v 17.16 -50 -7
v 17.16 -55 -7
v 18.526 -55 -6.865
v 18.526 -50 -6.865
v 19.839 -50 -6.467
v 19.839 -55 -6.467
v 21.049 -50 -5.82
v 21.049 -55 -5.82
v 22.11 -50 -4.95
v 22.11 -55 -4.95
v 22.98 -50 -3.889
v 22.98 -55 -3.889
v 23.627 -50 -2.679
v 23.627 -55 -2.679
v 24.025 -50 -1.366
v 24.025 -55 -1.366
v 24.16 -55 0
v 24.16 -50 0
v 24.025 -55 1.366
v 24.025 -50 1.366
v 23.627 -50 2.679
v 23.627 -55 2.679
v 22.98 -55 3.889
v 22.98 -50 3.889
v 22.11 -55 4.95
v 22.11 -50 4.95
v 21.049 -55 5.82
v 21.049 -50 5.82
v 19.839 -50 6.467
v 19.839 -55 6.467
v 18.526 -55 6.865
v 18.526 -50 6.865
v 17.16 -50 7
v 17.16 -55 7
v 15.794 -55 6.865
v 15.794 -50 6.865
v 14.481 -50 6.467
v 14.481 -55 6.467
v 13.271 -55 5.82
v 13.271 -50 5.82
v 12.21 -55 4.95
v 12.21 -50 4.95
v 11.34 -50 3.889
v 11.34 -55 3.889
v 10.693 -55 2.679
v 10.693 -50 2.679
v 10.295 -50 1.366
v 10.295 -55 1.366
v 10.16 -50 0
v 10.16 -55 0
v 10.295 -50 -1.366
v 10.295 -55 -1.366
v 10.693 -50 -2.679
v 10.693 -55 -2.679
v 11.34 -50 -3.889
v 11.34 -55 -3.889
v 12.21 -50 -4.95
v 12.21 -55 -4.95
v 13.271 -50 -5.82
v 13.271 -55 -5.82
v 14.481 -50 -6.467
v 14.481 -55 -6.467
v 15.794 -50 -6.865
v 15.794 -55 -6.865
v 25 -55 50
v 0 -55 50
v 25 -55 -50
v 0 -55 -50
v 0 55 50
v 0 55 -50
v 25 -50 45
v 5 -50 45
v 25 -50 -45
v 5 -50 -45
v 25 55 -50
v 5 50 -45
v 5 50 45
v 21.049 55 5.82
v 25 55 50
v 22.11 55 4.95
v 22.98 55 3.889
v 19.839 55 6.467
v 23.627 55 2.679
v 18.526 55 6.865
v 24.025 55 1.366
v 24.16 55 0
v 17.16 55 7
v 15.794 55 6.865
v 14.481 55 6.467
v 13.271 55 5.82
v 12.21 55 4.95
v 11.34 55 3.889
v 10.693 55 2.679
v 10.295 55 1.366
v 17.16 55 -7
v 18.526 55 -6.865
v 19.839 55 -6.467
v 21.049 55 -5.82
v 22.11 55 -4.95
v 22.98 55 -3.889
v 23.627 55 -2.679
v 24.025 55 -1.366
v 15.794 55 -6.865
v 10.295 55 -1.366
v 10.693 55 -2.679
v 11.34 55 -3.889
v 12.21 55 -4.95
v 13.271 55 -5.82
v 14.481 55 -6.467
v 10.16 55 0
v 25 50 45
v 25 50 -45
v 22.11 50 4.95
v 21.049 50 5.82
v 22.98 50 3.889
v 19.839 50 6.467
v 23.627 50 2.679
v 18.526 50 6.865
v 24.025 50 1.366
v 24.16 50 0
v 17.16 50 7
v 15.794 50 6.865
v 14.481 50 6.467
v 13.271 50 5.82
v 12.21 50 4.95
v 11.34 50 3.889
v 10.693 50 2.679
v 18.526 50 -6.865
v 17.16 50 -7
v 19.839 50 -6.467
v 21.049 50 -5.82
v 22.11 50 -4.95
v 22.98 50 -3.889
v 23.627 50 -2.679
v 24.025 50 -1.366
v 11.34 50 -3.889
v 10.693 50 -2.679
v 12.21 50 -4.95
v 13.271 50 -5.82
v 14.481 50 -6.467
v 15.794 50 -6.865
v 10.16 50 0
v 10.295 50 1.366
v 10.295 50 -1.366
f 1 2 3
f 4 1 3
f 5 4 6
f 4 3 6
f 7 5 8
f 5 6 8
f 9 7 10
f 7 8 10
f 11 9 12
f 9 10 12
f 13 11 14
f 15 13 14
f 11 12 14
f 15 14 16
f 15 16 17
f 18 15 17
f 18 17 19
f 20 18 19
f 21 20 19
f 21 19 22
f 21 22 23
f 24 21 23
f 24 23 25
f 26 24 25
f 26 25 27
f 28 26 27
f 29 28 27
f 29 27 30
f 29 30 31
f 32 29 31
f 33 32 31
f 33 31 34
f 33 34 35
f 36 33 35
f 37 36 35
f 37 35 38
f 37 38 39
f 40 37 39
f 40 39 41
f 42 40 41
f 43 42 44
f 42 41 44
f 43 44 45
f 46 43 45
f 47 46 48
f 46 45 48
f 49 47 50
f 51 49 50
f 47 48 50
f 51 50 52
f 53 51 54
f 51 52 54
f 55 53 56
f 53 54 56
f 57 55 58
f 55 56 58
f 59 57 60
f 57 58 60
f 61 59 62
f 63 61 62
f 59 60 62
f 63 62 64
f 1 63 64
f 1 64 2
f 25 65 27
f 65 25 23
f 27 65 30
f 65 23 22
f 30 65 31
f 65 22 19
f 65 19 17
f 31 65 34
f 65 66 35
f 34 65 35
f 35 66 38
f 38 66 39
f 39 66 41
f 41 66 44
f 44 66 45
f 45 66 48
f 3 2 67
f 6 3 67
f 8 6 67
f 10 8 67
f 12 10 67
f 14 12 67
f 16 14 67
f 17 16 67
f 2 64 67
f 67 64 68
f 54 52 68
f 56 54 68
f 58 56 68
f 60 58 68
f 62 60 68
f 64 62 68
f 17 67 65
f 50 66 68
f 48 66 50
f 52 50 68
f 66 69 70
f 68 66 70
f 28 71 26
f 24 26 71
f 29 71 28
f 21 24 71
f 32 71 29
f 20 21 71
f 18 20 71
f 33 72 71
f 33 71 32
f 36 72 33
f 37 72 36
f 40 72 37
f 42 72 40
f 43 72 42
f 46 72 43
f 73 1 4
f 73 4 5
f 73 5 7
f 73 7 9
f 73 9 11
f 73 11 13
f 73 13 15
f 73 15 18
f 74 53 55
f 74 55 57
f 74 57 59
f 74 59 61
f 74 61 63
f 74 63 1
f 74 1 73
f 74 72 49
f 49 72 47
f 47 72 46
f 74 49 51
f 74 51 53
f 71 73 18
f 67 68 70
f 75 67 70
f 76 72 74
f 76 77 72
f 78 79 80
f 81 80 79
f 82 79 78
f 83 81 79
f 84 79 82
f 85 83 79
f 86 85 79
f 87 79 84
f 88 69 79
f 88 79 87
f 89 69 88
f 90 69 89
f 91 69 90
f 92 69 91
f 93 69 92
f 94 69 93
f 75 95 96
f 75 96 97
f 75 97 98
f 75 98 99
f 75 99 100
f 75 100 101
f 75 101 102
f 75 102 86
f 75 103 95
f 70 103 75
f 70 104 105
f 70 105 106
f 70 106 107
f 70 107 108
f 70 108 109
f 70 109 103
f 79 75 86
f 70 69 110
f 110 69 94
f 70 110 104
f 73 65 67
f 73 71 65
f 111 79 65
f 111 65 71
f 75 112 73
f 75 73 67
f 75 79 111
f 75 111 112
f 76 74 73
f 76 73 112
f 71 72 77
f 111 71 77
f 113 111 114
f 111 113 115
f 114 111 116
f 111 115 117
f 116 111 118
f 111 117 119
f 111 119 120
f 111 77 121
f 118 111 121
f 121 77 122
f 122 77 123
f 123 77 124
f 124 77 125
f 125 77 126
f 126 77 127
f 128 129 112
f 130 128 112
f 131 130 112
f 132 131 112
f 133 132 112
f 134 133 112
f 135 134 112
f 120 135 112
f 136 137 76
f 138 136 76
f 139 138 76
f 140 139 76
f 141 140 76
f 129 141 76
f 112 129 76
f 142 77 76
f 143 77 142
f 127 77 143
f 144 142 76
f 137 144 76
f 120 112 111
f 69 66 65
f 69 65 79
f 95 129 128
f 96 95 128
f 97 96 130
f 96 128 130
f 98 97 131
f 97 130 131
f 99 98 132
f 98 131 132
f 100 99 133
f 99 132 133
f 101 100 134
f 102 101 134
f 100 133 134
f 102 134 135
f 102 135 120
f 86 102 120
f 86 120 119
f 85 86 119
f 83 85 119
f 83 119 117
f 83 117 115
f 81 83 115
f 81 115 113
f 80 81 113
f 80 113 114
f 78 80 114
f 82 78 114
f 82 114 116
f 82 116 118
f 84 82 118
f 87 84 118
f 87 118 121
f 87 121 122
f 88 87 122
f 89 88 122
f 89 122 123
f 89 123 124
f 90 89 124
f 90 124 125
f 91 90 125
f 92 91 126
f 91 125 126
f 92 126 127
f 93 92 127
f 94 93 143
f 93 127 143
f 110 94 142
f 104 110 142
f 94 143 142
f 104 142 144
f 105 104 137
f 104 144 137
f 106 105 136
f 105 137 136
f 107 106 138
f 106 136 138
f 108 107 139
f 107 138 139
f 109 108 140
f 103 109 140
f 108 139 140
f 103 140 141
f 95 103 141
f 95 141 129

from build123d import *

# Parameters (mm, degrees)
SKETCH2_W           = 100
SKETCH2_H           = 110
BOSS_EXTRUDE1_DEPTH = 5
SKETCH2_3_W         = 100
SKETCH2_3_H         = 110
SKETCH2_3_W_2       = 90
SKETCH2_3_H_2       = 100
BOSS_EXTRUDE2_DEPTH = 25
SKETCH3_R           = 7
CUT_EXTRUDE1_DEPTH  = 124.389626793


with BuildPart() as part:
    # Sketch2 → Boss-Extrude1 (new body)
    with BuildSketch(Plane(origin=(0, 0, 0), x_dir=(0, 0, -1), z_dir=(1, 0, 0))):
        Rectangle(SKETCH2_W, SKETCH2_H)
    extrude(amount=BOSS_EXTRUDE1_DEPTH)

    # Sketch2<3> → Boss-Extrude2 (add)
    with BuildSketch(Plane(origin=(0, 0, 0), x_dir=(0, 0, -1), z_dir=(1, 0, 0))):
        Rectangle(SKETCH2_3_W, SKETCH2_3_H)
        Rectangle(SKETCH2_3_W_2, SKETCH2_3_H_2, mode=Mode.SUBTRACT)
    extrude(amount=BOSS_EXTRUDE2_DEPTH)

    # Sketch3 → Cut-Extrude1 (cut, through all)
    with BuildSketch(Plane.XZ.offset(55)):
        with Locations((17.16, 0)):
            Circle(SKETCH3_R)
    extrude(amount=-CUT_EXTRUDE1_DEPTH, mode=Mode.SUBTRACT)


solid = part.part
